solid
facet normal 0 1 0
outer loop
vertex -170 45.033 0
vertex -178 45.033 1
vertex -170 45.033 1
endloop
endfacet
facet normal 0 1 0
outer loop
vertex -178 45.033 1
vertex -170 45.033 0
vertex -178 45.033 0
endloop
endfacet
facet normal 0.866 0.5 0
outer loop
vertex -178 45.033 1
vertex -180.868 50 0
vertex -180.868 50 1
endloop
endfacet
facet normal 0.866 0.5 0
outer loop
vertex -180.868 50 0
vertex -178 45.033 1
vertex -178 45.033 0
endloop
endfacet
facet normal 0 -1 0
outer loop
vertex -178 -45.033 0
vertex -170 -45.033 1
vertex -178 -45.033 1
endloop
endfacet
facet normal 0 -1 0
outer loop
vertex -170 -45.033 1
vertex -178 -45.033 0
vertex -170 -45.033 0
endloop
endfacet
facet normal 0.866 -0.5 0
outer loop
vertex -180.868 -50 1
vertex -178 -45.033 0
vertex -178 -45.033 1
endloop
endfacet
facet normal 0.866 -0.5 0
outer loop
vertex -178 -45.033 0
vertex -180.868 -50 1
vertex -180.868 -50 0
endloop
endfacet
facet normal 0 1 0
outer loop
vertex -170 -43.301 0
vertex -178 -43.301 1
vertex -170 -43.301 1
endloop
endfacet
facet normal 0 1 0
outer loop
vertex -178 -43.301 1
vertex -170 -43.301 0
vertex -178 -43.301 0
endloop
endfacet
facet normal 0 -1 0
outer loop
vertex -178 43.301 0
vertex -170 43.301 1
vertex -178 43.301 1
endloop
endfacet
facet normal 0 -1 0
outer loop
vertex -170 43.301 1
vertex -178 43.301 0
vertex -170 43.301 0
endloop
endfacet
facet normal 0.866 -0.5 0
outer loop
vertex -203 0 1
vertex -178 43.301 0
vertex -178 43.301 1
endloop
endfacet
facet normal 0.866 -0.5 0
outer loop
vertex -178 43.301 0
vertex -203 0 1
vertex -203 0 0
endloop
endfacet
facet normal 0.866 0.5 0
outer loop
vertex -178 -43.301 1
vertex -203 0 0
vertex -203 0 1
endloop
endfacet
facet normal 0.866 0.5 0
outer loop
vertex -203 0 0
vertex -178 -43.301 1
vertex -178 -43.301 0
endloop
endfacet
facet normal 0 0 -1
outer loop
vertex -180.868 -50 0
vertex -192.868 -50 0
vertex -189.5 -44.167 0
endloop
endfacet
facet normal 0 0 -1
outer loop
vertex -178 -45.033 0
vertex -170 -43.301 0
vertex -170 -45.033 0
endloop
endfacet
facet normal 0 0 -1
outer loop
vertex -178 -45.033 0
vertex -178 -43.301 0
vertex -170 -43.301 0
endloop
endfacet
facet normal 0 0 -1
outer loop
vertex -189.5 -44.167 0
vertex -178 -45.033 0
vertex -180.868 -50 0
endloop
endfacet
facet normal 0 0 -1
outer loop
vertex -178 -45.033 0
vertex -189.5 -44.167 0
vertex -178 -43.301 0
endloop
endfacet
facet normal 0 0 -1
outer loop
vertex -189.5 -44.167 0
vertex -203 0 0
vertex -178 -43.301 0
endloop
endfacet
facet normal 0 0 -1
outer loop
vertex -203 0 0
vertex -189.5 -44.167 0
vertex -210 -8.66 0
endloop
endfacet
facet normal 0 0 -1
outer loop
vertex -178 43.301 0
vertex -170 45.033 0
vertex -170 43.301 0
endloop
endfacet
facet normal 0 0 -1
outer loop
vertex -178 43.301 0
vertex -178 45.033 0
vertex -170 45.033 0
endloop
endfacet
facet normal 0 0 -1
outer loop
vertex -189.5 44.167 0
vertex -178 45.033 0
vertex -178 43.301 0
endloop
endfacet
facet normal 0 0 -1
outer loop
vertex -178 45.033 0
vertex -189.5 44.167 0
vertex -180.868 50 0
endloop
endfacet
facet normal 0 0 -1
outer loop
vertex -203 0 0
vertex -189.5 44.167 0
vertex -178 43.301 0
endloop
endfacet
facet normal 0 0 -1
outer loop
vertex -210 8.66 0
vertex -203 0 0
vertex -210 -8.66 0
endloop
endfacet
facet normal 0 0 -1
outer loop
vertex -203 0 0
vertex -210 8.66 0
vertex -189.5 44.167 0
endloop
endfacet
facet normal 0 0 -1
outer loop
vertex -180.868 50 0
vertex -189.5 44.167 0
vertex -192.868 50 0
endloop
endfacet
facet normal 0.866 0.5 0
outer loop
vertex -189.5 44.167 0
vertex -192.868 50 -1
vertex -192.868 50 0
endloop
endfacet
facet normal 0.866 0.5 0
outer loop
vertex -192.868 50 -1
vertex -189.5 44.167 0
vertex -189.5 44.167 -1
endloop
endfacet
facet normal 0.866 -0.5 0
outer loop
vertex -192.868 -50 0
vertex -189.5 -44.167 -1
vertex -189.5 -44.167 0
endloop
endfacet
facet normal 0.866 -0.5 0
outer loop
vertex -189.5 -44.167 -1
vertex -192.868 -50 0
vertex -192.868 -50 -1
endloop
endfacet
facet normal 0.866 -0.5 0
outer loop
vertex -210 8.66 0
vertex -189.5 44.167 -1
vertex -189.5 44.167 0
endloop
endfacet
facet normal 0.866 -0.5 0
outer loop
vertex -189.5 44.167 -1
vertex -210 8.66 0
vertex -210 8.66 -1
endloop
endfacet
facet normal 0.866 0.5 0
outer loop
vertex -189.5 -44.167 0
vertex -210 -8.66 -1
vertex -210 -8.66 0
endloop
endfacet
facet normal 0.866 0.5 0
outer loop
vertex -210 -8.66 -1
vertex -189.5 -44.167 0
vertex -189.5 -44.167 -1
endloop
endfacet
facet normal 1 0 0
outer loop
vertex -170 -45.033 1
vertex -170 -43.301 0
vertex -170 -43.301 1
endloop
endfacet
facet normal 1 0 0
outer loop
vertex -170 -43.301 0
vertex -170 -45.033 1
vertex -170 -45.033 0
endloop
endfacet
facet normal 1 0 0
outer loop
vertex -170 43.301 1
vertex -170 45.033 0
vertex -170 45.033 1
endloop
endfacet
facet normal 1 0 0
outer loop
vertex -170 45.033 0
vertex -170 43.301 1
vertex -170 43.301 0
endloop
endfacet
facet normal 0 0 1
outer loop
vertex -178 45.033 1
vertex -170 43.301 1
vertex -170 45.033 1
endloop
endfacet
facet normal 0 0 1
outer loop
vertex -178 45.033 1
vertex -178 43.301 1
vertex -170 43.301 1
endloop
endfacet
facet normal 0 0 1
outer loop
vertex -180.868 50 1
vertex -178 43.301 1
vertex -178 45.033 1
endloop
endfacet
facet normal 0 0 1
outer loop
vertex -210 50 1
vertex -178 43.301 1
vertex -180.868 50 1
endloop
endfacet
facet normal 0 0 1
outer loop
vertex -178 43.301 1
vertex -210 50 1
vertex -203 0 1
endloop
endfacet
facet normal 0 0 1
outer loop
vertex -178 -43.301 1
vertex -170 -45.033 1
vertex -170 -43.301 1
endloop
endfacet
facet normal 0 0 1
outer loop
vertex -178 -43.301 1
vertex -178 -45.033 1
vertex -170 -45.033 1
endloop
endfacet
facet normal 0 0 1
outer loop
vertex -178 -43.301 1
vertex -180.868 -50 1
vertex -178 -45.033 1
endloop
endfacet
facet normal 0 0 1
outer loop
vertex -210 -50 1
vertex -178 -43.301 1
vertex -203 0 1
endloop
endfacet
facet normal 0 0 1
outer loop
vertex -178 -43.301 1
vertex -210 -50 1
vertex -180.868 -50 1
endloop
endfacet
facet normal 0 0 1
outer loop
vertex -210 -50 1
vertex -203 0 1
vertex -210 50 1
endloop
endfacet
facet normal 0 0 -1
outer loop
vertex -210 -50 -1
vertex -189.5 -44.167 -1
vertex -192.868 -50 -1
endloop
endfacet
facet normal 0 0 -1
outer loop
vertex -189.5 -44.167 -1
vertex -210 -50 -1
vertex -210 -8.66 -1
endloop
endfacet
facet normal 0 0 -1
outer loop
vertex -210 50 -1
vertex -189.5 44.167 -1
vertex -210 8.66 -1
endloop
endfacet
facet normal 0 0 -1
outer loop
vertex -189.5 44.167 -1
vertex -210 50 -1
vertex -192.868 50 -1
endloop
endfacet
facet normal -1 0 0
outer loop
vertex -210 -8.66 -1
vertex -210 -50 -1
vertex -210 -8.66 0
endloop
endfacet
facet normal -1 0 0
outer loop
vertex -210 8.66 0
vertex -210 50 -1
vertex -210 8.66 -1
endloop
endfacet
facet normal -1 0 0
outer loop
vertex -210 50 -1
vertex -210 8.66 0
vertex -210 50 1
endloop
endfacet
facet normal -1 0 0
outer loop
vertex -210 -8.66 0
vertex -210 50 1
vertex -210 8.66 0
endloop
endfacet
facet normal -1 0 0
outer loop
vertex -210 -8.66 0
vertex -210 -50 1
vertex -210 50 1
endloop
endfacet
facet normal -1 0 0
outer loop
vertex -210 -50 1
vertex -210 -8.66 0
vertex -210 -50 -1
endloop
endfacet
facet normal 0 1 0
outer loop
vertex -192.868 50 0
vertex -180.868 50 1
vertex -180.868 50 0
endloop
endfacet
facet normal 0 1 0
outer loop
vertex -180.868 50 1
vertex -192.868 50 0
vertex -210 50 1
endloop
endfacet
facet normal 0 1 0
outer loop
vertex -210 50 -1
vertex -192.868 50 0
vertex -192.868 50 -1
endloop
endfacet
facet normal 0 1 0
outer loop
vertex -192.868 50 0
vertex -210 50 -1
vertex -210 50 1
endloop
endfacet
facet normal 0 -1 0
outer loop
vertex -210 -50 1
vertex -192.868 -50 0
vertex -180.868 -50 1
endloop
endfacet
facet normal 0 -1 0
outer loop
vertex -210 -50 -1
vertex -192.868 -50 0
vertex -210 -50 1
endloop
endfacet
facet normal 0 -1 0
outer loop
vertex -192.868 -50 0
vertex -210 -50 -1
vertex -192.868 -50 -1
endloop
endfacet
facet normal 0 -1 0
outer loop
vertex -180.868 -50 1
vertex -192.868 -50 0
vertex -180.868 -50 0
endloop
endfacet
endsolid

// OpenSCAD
radius=50;
distance=2;
side=(sqrt(3) / 2) * (radius + distance/2);
borderHeight = 3;
height = 16;
externalBorder = 10;

difference(){
    translate([-210, -50, -1])
    cube([40, 100, 2]);
    union(){
        echo("MIRROR INTERNAL");
        // from 0 to 360 in step of 60
        for ( angle = [0 : 60 : 359] ){
            x = (side) * 2 * cos(angle + 30);
            y = (side) * 2 * sin(angle + 30);
            echo("x ", x, " and y ", y)
            translate([x,y,0]){
                //color([1,0,0]) //red
                //cylinder(r=radius + distance, h=height-0.1, $fn=6,center = true);
                    
                color([0,1,0]) //green
                cylinder(r=radius, h=height, $fn=6,center = true);
            }
        }

        echo("MIRROR EXTERNAL 1");
        // from 0 to 360 in step of 60
        for ( angle = [0 : 60 : 359] ){
            x = (side) * 2 * cos(angle + 30) * 2;
            y = (side) * 2 * sin(angle + 30) * 2;
            echo("x ", x, " and y ", y)
            translate([x,y,0]){
                //color([1,0,0]) //red
                //cylinder(r=radius + distance, h=height-0.1, $fn=6,center = true);
                    
                color([0,1,0]) //green
                cylinder(r=radius, h=height, $fn=6,center = true);
            }
        }

        echo("MIRROR EXTERNAL 2");
        // from 30 to 360 in step of 60
        for ( angle = [30 : 60 : 359] ){
            x = (radius + distance / 2) * 1.5 * cos(angle + 30) * 2;
            y = (radius + distance / 2) * 1.5 * sin(angle + 30) * 2;
            echo("x ", x, " and y ", y)
            translate([x,y,0]){
                //color([1,0,0]) //red
                //cylinder(r=radius + distance, h=height-0.1, $fn=6,center = true);
                    
                color([0,1,0]) //green
                cylinder(r=radius, h=height, $fn=6,center = true);
            }
        }

        echo("BORDER EXTERNAL 1");
        // from 0 to 360 in step of 60
        sideBorder=(sqrt(3) / 2) * (radius + externalBorder);
        for ( angle = [0 : 60 : 359] ){
            x = (side) * 2 * cos(angle + 30) * 2;
            y = (side) * 2 * sin(angle + 30) * 2;
            echo("x ", x, " and y ", y)
            
            translate([x,y,-borderHeight/2]){
                color([0,0,1]) //blue
                cylinder(r=radius + distance + externalBorder, h=borderHeight, $fn=6,center = true);
            }
        }

        echo("BORDER EXTERNAL 2");
        // from 30 to 360 in step of 60
        for ( angle = [30 : 60 : 359] ){
            x = (radius + distance / 2) * 1.5 * cos(angle + 30) * 2;
            y = (radius + distance / 2) * 1.5 * sin(angle + 30) * 2;
            echo("x ", x, " and y ", y)
            translate([x,y,-borderHeight/2]){
                color([0,0,1]) //blue
                cylinder(r=radius + distance + externalBorder, h=borderHeight, $fn=6,center = true);
            }
        }
    };
    
}
